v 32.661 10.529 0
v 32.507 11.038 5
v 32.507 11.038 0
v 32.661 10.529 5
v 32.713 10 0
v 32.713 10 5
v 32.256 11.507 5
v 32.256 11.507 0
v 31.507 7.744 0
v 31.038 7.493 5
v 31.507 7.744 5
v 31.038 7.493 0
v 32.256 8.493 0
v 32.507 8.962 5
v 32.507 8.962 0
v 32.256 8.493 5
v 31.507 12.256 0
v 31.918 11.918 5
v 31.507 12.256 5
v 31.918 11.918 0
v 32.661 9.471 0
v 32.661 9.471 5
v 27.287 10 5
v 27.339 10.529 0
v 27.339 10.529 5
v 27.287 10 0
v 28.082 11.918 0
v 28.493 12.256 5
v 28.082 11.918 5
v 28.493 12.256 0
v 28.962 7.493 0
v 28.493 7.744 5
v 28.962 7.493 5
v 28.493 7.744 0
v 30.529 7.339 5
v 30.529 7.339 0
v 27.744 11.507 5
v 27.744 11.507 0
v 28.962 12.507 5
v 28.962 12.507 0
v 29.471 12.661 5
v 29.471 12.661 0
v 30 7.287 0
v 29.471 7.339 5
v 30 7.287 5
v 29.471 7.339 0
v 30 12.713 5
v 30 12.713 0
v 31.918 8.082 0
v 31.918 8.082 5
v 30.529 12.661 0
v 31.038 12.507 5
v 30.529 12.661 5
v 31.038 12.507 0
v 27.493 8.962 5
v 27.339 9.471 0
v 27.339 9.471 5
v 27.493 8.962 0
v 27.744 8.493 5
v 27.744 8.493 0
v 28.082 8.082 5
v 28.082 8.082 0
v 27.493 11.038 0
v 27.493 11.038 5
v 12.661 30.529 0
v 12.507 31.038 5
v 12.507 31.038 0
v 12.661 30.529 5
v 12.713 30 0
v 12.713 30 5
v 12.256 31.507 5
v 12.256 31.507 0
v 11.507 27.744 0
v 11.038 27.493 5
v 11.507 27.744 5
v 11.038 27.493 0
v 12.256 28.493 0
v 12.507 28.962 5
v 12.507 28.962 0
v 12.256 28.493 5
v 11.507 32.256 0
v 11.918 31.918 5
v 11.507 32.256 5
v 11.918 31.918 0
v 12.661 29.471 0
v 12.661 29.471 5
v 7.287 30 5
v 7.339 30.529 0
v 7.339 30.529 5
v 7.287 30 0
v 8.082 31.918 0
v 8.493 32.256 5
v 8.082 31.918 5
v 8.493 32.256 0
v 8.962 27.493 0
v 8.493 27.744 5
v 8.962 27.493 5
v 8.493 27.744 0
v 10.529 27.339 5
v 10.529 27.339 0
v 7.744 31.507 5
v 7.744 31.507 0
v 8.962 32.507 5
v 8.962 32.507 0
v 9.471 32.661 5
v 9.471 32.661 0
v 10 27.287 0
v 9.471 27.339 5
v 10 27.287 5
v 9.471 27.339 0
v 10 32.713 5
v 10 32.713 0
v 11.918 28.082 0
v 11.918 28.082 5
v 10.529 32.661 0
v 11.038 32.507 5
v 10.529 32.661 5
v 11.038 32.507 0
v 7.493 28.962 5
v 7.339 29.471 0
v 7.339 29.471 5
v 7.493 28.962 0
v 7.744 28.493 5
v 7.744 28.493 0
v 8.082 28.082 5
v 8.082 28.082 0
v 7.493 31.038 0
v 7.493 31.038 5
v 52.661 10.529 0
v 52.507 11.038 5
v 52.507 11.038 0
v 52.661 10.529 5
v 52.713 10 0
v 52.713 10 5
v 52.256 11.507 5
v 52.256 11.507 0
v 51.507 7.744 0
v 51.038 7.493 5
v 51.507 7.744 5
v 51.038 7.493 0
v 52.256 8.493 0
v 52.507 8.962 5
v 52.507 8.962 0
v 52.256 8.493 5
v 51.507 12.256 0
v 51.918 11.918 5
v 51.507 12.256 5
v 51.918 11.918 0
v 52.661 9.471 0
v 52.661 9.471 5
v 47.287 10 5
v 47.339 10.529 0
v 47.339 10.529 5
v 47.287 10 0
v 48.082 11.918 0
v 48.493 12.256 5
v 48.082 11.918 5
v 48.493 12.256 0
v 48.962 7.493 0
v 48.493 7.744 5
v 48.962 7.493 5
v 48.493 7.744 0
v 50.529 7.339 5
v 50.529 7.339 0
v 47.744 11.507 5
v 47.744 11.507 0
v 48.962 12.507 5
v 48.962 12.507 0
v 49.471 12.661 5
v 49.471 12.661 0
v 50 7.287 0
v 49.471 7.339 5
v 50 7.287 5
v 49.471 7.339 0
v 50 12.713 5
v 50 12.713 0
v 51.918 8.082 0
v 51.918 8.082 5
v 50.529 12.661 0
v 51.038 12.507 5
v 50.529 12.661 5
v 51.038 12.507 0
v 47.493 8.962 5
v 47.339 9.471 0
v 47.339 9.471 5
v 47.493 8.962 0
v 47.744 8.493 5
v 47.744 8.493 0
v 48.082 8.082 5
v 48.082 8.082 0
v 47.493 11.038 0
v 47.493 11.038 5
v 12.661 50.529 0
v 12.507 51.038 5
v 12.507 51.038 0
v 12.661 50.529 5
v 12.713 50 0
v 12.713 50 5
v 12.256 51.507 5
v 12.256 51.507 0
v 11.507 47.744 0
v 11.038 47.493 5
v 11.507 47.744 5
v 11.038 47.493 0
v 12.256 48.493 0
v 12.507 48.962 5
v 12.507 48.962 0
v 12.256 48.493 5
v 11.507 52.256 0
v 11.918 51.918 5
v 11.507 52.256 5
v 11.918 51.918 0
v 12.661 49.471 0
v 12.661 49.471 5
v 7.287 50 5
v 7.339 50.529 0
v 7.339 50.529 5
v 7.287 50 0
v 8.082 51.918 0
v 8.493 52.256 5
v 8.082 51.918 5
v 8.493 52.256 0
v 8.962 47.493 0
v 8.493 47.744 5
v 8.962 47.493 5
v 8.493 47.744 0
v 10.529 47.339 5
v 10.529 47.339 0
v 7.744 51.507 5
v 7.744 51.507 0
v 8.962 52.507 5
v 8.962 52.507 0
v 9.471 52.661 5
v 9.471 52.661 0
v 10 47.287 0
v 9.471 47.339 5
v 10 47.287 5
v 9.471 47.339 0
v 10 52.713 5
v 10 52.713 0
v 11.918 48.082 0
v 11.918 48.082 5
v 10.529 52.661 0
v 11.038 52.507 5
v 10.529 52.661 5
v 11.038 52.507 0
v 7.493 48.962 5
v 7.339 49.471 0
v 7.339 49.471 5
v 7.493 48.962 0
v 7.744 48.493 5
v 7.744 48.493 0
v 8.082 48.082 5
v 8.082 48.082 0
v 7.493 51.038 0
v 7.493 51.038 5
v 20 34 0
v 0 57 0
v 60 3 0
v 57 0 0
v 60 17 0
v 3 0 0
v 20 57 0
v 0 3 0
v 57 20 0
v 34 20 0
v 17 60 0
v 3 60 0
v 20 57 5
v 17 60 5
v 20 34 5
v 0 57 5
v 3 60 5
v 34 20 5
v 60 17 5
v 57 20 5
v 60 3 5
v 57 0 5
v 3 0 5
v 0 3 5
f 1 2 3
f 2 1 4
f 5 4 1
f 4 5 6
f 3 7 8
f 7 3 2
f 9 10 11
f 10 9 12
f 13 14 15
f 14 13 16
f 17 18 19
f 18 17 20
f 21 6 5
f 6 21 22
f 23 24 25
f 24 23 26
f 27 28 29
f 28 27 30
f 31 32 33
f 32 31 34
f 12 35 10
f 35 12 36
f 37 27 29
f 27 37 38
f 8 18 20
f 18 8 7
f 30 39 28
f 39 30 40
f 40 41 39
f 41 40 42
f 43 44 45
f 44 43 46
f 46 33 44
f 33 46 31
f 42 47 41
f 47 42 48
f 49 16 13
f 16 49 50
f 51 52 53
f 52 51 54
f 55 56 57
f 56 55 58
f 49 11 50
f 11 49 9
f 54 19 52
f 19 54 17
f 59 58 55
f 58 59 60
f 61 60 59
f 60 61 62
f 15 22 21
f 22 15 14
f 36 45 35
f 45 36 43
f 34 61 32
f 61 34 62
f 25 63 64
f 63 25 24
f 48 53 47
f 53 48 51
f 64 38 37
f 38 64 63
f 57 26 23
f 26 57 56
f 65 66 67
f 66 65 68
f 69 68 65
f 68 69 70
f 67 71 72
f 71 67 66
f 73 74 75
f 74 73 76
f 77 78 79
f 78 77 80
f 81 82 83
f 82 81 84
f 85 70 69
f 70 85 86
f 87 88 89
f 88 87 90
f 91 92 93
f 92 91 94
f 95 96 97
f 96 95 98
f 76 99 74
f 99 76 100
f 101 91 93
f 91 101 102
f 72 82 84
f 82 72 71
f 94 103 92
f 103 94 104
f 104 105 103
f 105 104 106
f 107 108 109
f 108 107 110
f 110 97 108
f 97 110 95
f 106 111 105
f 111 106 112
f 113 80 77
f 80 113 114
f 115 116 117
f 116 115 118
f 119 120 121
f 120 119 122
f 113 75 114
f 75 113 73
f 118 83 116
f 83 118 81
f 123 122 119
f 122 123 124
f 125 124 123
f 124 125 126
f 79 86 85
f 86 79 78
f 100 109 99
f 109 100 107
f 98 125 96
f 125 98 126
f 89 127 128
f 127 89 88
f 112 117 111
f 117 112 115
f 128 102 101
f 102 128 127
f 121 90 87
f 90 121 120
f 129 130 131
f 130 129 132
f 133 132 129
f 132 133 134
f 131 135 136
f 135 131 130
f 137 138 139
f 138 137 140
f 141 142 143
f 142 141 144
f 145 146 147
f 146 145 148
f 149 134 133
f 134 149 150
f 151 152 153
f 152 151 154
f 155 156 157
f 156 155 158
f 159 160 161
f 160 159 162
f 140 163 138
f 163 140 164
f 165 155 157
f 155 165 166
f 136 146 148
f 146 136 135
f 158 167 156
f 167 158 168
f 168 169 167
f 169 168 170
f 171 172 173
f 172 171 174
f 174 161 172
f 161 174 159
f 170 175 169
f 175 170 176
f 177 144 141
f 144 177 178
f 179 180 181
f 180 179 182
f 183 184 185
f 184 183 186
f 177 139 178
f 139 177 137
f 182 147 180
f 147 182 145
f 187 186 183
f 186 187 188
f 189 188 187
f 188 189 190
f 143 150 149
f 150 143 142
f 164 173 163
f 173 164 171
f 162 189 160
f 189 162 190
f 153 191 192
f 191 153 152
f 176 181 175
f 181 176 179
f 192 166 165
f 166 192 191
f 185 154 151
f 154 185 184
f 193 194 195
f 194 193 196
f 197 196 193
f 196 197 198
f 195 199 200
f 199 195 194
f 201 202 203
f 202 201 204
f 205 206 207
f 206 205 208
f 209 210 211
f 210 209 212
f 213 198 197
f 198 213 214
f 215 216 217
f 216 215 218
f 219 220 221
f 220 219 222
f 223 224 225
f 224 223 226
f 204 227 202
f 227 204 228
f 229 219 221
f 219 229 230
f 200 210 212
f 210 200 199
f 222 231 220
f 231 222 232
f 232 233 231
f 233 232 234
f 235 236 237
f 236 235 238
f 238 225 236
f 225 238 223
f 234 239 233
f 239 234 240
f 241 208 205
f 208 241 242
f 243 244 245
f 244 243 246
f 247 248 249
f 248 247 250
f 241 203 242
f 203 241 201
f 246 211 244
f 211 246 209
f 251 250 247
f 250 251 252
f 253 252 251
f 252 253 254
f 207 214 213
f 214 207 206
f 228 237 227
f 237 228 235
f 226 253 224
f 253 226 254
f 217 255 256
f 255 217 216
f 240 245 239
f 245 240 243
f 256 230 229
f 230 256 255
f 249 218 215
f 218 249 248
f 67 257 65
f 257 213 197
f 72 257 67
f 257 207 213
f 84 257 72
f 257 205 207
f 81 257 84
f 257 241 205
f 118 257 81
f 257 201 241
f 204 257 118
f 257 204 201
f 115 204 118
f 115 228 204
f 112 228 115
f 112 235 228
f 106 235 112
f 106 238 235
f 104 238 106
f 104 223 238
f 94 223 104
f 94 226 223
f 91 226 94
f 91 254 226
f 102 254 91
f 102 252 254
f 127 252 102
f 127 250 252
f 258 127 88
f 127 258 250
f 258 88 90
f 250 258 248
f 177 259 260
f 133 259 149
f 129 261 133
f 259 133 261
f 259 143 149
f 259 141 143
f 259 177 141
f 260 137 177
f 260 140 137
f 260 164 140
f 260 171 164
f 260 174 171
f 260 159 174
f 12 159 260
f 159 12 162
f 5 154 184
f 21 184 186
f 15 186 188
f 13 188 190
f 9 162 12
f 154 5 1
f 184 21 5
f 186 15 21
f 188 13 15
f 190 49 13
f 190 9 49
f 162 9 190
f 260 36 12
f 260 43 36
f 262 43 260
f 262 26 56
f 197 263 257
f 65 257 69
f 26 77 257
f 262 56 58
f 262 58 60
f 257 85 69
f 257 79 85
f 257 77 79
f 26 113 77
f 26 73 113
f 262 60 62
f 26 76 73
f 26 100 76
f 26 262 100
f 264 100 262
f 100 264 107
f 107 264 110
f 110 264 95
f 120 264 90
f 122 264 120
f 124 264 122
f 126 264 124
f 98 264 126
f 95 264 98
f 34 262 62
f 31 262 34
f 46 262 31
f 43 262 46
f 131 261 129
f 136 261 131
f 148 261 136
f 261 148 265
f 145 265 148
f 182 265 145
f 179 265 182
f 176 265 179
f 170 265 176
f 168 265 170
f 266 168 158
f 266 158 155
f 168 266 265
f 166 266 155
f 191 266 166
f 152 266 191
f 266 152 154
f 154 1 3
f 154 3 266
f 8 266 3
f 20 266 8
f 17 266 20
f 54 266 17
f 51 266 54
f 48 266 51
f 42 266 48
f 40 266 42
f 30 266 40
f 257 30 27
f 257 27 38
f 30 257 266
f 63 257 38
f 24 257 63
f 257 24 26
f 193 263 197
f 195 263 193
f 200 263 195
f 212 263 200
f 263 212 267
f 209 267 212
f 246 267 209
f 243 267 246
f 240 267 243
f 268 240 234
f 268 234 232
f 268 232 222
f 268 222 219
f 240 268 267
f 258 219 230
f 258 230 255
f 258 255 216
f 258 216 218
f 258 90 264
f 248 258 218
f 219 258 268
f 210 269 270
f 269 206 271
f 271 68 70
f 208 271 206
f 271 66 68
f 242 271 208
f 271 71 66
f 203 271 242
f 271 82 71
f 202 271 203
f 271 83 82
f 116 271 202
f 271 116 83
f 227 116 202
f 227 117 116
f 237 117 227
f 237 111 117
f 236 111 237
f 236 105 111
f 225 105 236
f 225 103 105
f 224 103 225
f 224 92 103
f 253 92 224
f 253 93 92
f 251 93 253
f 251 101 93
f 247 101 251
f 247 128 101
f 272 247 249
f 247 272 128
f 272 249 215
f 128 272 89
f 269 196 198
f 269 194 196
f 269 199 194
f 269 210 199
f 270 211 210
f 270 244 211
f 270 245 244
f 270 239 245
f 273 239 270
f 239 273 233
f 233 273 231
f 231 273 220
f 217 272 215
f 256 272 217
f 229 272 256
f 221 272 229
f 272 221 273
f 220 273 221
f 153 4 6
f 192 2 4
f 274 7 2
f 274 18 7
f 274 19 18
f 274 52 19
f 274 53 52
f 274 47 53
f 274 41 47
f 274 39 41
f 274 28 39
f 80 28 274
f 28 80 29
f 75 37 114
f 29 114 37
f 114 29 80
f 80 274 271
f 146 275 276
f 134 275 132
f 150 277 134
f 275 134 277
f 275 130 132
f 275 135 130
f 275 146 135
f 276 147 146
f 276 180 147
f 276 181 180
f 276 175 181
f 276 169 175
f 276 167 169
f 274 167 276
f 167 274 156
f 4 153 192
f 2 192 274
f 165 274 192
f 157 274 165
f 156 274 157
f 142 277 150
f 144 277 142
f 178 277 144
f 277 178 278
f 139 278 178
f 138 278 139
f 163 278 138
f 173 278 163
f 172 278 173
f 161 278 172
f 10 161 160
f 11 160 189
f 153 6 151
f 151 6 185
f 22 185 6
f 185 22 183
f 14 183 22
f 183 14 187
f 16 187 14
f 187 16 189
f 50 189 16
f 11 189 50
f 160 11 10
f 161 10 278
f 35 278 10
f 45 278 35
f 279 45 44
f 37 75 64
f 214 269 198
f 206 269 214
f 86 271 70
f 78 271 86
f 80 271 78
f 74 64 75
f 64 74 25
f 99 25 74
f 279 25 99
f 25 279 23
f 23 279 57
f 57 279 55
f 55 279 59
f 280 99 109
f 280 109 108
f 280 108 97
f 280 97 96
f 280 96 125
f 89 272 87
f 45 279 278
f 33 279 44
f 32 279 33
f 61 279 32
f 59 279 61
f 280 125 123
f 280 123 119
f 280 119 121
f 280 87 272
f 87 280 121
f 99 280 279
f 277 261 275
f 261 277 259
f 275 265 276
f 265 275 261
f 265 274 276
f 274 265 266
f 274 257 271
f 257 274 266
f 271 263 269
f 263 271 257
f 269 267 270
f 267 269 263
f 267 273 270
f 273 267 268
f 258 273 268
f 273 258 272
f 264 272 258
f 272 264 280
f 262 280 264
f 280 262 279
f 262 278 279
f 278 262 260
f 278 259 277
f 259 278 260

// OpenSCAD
// Flat corner gusset for two coplanar 2020 rails meeting at 90 degrees.
// Print as shown, broad face on the bed; no supports. Units: mm.
// Use four M5 screws + washers and metal T-nuts matched to your profile.
// Set screw_diameter=3 for M3 T-nuts. Rails occupy x=0..20 and y=0..20;
// one rail butts against the other. Holes start beyond the butt joint.
// Fits the outer faces of 20 mm V-slot and B-type T-slot (nominal slot 6).
// V-slot drawing: 6.25 mm throat; B-type: 6 mm slot.
// Nut cavities differ: this plate does not assume interchangeable T-nuts.
// Sources: https://www.motedis.com/en/Profile-20x20-B-type-slot-6
// https://bitfab.parts/wp-content/uploads/2023/11/2020V-20x20mm-V-Slot-Profile-Drawing-v2.pdf
// https://www.motedis.com/en/T-nut-B-type-slot-6-M5
// https://www.motedis.com/en/T-nut-B-type-slot-6-M3

profile_width = 20; // Rail face width, mm [20:1:20]
arm_length = 60; // Length of each arm, mm [55:1:85]
plate_thickness = 5; // Plate thickness, mm [4:0.5:8]
screw_diameter = 5; // Metal T-nut thread diameter, mm [3:2:5]
hole_clearance = 0.4; // Added screw-hole diameter, mm [0.2:0.05:0.4]
edge_margin = 10; // Far hole distance from arm end, mm [8:1:12]
web_size = 14; // Diagonal reinforcement across inner corner, mm [8:1:20]
corner_cut = 3; // Exposed corner chamfer, mm [1:0.5:5]
$fn = 32; // Screw-hole facets [24:8:64]

// Compensate polygon flats so the minimum bore has the stated clearance.
hole_diameter = (screw_diameter+hole_clearance)/cos(180/$fn);

// A single extruded outline keeps the plate flat and the boolean work small.
color("#55a9e8") difference() {
    linear_extrude(height=plate_thickness)
        polygon([[corner_cut,0], [arm_length-corner_cut,0],
                 [arm_length,corner_cut], [arm_length,profile_width-corner_cut],
                 [arm_length-corner_cut,profile_width],
                 [profile_width+web_size,profile_width],
                 [profile_width,profile_width+web_size],
                 [profile_width,arm_length-corner_cut],
                 [profile_width-corner_cut,arm_length], [corner_cut,arm_length],
                 [0,arm_length-corner_cut], [0,corner_cut]]);
    for (distance = [profile_width+10, arm_length-edge_margin]) {
        translate([distance,profile_width/2,-1])
            cylinder(h=plate_thickness+2,d=hole_diameter);
        translate([profile_width/2,distance,-1])
            cylinder(h=plate_thickness+2,d=hole_diameter);
    }
}
